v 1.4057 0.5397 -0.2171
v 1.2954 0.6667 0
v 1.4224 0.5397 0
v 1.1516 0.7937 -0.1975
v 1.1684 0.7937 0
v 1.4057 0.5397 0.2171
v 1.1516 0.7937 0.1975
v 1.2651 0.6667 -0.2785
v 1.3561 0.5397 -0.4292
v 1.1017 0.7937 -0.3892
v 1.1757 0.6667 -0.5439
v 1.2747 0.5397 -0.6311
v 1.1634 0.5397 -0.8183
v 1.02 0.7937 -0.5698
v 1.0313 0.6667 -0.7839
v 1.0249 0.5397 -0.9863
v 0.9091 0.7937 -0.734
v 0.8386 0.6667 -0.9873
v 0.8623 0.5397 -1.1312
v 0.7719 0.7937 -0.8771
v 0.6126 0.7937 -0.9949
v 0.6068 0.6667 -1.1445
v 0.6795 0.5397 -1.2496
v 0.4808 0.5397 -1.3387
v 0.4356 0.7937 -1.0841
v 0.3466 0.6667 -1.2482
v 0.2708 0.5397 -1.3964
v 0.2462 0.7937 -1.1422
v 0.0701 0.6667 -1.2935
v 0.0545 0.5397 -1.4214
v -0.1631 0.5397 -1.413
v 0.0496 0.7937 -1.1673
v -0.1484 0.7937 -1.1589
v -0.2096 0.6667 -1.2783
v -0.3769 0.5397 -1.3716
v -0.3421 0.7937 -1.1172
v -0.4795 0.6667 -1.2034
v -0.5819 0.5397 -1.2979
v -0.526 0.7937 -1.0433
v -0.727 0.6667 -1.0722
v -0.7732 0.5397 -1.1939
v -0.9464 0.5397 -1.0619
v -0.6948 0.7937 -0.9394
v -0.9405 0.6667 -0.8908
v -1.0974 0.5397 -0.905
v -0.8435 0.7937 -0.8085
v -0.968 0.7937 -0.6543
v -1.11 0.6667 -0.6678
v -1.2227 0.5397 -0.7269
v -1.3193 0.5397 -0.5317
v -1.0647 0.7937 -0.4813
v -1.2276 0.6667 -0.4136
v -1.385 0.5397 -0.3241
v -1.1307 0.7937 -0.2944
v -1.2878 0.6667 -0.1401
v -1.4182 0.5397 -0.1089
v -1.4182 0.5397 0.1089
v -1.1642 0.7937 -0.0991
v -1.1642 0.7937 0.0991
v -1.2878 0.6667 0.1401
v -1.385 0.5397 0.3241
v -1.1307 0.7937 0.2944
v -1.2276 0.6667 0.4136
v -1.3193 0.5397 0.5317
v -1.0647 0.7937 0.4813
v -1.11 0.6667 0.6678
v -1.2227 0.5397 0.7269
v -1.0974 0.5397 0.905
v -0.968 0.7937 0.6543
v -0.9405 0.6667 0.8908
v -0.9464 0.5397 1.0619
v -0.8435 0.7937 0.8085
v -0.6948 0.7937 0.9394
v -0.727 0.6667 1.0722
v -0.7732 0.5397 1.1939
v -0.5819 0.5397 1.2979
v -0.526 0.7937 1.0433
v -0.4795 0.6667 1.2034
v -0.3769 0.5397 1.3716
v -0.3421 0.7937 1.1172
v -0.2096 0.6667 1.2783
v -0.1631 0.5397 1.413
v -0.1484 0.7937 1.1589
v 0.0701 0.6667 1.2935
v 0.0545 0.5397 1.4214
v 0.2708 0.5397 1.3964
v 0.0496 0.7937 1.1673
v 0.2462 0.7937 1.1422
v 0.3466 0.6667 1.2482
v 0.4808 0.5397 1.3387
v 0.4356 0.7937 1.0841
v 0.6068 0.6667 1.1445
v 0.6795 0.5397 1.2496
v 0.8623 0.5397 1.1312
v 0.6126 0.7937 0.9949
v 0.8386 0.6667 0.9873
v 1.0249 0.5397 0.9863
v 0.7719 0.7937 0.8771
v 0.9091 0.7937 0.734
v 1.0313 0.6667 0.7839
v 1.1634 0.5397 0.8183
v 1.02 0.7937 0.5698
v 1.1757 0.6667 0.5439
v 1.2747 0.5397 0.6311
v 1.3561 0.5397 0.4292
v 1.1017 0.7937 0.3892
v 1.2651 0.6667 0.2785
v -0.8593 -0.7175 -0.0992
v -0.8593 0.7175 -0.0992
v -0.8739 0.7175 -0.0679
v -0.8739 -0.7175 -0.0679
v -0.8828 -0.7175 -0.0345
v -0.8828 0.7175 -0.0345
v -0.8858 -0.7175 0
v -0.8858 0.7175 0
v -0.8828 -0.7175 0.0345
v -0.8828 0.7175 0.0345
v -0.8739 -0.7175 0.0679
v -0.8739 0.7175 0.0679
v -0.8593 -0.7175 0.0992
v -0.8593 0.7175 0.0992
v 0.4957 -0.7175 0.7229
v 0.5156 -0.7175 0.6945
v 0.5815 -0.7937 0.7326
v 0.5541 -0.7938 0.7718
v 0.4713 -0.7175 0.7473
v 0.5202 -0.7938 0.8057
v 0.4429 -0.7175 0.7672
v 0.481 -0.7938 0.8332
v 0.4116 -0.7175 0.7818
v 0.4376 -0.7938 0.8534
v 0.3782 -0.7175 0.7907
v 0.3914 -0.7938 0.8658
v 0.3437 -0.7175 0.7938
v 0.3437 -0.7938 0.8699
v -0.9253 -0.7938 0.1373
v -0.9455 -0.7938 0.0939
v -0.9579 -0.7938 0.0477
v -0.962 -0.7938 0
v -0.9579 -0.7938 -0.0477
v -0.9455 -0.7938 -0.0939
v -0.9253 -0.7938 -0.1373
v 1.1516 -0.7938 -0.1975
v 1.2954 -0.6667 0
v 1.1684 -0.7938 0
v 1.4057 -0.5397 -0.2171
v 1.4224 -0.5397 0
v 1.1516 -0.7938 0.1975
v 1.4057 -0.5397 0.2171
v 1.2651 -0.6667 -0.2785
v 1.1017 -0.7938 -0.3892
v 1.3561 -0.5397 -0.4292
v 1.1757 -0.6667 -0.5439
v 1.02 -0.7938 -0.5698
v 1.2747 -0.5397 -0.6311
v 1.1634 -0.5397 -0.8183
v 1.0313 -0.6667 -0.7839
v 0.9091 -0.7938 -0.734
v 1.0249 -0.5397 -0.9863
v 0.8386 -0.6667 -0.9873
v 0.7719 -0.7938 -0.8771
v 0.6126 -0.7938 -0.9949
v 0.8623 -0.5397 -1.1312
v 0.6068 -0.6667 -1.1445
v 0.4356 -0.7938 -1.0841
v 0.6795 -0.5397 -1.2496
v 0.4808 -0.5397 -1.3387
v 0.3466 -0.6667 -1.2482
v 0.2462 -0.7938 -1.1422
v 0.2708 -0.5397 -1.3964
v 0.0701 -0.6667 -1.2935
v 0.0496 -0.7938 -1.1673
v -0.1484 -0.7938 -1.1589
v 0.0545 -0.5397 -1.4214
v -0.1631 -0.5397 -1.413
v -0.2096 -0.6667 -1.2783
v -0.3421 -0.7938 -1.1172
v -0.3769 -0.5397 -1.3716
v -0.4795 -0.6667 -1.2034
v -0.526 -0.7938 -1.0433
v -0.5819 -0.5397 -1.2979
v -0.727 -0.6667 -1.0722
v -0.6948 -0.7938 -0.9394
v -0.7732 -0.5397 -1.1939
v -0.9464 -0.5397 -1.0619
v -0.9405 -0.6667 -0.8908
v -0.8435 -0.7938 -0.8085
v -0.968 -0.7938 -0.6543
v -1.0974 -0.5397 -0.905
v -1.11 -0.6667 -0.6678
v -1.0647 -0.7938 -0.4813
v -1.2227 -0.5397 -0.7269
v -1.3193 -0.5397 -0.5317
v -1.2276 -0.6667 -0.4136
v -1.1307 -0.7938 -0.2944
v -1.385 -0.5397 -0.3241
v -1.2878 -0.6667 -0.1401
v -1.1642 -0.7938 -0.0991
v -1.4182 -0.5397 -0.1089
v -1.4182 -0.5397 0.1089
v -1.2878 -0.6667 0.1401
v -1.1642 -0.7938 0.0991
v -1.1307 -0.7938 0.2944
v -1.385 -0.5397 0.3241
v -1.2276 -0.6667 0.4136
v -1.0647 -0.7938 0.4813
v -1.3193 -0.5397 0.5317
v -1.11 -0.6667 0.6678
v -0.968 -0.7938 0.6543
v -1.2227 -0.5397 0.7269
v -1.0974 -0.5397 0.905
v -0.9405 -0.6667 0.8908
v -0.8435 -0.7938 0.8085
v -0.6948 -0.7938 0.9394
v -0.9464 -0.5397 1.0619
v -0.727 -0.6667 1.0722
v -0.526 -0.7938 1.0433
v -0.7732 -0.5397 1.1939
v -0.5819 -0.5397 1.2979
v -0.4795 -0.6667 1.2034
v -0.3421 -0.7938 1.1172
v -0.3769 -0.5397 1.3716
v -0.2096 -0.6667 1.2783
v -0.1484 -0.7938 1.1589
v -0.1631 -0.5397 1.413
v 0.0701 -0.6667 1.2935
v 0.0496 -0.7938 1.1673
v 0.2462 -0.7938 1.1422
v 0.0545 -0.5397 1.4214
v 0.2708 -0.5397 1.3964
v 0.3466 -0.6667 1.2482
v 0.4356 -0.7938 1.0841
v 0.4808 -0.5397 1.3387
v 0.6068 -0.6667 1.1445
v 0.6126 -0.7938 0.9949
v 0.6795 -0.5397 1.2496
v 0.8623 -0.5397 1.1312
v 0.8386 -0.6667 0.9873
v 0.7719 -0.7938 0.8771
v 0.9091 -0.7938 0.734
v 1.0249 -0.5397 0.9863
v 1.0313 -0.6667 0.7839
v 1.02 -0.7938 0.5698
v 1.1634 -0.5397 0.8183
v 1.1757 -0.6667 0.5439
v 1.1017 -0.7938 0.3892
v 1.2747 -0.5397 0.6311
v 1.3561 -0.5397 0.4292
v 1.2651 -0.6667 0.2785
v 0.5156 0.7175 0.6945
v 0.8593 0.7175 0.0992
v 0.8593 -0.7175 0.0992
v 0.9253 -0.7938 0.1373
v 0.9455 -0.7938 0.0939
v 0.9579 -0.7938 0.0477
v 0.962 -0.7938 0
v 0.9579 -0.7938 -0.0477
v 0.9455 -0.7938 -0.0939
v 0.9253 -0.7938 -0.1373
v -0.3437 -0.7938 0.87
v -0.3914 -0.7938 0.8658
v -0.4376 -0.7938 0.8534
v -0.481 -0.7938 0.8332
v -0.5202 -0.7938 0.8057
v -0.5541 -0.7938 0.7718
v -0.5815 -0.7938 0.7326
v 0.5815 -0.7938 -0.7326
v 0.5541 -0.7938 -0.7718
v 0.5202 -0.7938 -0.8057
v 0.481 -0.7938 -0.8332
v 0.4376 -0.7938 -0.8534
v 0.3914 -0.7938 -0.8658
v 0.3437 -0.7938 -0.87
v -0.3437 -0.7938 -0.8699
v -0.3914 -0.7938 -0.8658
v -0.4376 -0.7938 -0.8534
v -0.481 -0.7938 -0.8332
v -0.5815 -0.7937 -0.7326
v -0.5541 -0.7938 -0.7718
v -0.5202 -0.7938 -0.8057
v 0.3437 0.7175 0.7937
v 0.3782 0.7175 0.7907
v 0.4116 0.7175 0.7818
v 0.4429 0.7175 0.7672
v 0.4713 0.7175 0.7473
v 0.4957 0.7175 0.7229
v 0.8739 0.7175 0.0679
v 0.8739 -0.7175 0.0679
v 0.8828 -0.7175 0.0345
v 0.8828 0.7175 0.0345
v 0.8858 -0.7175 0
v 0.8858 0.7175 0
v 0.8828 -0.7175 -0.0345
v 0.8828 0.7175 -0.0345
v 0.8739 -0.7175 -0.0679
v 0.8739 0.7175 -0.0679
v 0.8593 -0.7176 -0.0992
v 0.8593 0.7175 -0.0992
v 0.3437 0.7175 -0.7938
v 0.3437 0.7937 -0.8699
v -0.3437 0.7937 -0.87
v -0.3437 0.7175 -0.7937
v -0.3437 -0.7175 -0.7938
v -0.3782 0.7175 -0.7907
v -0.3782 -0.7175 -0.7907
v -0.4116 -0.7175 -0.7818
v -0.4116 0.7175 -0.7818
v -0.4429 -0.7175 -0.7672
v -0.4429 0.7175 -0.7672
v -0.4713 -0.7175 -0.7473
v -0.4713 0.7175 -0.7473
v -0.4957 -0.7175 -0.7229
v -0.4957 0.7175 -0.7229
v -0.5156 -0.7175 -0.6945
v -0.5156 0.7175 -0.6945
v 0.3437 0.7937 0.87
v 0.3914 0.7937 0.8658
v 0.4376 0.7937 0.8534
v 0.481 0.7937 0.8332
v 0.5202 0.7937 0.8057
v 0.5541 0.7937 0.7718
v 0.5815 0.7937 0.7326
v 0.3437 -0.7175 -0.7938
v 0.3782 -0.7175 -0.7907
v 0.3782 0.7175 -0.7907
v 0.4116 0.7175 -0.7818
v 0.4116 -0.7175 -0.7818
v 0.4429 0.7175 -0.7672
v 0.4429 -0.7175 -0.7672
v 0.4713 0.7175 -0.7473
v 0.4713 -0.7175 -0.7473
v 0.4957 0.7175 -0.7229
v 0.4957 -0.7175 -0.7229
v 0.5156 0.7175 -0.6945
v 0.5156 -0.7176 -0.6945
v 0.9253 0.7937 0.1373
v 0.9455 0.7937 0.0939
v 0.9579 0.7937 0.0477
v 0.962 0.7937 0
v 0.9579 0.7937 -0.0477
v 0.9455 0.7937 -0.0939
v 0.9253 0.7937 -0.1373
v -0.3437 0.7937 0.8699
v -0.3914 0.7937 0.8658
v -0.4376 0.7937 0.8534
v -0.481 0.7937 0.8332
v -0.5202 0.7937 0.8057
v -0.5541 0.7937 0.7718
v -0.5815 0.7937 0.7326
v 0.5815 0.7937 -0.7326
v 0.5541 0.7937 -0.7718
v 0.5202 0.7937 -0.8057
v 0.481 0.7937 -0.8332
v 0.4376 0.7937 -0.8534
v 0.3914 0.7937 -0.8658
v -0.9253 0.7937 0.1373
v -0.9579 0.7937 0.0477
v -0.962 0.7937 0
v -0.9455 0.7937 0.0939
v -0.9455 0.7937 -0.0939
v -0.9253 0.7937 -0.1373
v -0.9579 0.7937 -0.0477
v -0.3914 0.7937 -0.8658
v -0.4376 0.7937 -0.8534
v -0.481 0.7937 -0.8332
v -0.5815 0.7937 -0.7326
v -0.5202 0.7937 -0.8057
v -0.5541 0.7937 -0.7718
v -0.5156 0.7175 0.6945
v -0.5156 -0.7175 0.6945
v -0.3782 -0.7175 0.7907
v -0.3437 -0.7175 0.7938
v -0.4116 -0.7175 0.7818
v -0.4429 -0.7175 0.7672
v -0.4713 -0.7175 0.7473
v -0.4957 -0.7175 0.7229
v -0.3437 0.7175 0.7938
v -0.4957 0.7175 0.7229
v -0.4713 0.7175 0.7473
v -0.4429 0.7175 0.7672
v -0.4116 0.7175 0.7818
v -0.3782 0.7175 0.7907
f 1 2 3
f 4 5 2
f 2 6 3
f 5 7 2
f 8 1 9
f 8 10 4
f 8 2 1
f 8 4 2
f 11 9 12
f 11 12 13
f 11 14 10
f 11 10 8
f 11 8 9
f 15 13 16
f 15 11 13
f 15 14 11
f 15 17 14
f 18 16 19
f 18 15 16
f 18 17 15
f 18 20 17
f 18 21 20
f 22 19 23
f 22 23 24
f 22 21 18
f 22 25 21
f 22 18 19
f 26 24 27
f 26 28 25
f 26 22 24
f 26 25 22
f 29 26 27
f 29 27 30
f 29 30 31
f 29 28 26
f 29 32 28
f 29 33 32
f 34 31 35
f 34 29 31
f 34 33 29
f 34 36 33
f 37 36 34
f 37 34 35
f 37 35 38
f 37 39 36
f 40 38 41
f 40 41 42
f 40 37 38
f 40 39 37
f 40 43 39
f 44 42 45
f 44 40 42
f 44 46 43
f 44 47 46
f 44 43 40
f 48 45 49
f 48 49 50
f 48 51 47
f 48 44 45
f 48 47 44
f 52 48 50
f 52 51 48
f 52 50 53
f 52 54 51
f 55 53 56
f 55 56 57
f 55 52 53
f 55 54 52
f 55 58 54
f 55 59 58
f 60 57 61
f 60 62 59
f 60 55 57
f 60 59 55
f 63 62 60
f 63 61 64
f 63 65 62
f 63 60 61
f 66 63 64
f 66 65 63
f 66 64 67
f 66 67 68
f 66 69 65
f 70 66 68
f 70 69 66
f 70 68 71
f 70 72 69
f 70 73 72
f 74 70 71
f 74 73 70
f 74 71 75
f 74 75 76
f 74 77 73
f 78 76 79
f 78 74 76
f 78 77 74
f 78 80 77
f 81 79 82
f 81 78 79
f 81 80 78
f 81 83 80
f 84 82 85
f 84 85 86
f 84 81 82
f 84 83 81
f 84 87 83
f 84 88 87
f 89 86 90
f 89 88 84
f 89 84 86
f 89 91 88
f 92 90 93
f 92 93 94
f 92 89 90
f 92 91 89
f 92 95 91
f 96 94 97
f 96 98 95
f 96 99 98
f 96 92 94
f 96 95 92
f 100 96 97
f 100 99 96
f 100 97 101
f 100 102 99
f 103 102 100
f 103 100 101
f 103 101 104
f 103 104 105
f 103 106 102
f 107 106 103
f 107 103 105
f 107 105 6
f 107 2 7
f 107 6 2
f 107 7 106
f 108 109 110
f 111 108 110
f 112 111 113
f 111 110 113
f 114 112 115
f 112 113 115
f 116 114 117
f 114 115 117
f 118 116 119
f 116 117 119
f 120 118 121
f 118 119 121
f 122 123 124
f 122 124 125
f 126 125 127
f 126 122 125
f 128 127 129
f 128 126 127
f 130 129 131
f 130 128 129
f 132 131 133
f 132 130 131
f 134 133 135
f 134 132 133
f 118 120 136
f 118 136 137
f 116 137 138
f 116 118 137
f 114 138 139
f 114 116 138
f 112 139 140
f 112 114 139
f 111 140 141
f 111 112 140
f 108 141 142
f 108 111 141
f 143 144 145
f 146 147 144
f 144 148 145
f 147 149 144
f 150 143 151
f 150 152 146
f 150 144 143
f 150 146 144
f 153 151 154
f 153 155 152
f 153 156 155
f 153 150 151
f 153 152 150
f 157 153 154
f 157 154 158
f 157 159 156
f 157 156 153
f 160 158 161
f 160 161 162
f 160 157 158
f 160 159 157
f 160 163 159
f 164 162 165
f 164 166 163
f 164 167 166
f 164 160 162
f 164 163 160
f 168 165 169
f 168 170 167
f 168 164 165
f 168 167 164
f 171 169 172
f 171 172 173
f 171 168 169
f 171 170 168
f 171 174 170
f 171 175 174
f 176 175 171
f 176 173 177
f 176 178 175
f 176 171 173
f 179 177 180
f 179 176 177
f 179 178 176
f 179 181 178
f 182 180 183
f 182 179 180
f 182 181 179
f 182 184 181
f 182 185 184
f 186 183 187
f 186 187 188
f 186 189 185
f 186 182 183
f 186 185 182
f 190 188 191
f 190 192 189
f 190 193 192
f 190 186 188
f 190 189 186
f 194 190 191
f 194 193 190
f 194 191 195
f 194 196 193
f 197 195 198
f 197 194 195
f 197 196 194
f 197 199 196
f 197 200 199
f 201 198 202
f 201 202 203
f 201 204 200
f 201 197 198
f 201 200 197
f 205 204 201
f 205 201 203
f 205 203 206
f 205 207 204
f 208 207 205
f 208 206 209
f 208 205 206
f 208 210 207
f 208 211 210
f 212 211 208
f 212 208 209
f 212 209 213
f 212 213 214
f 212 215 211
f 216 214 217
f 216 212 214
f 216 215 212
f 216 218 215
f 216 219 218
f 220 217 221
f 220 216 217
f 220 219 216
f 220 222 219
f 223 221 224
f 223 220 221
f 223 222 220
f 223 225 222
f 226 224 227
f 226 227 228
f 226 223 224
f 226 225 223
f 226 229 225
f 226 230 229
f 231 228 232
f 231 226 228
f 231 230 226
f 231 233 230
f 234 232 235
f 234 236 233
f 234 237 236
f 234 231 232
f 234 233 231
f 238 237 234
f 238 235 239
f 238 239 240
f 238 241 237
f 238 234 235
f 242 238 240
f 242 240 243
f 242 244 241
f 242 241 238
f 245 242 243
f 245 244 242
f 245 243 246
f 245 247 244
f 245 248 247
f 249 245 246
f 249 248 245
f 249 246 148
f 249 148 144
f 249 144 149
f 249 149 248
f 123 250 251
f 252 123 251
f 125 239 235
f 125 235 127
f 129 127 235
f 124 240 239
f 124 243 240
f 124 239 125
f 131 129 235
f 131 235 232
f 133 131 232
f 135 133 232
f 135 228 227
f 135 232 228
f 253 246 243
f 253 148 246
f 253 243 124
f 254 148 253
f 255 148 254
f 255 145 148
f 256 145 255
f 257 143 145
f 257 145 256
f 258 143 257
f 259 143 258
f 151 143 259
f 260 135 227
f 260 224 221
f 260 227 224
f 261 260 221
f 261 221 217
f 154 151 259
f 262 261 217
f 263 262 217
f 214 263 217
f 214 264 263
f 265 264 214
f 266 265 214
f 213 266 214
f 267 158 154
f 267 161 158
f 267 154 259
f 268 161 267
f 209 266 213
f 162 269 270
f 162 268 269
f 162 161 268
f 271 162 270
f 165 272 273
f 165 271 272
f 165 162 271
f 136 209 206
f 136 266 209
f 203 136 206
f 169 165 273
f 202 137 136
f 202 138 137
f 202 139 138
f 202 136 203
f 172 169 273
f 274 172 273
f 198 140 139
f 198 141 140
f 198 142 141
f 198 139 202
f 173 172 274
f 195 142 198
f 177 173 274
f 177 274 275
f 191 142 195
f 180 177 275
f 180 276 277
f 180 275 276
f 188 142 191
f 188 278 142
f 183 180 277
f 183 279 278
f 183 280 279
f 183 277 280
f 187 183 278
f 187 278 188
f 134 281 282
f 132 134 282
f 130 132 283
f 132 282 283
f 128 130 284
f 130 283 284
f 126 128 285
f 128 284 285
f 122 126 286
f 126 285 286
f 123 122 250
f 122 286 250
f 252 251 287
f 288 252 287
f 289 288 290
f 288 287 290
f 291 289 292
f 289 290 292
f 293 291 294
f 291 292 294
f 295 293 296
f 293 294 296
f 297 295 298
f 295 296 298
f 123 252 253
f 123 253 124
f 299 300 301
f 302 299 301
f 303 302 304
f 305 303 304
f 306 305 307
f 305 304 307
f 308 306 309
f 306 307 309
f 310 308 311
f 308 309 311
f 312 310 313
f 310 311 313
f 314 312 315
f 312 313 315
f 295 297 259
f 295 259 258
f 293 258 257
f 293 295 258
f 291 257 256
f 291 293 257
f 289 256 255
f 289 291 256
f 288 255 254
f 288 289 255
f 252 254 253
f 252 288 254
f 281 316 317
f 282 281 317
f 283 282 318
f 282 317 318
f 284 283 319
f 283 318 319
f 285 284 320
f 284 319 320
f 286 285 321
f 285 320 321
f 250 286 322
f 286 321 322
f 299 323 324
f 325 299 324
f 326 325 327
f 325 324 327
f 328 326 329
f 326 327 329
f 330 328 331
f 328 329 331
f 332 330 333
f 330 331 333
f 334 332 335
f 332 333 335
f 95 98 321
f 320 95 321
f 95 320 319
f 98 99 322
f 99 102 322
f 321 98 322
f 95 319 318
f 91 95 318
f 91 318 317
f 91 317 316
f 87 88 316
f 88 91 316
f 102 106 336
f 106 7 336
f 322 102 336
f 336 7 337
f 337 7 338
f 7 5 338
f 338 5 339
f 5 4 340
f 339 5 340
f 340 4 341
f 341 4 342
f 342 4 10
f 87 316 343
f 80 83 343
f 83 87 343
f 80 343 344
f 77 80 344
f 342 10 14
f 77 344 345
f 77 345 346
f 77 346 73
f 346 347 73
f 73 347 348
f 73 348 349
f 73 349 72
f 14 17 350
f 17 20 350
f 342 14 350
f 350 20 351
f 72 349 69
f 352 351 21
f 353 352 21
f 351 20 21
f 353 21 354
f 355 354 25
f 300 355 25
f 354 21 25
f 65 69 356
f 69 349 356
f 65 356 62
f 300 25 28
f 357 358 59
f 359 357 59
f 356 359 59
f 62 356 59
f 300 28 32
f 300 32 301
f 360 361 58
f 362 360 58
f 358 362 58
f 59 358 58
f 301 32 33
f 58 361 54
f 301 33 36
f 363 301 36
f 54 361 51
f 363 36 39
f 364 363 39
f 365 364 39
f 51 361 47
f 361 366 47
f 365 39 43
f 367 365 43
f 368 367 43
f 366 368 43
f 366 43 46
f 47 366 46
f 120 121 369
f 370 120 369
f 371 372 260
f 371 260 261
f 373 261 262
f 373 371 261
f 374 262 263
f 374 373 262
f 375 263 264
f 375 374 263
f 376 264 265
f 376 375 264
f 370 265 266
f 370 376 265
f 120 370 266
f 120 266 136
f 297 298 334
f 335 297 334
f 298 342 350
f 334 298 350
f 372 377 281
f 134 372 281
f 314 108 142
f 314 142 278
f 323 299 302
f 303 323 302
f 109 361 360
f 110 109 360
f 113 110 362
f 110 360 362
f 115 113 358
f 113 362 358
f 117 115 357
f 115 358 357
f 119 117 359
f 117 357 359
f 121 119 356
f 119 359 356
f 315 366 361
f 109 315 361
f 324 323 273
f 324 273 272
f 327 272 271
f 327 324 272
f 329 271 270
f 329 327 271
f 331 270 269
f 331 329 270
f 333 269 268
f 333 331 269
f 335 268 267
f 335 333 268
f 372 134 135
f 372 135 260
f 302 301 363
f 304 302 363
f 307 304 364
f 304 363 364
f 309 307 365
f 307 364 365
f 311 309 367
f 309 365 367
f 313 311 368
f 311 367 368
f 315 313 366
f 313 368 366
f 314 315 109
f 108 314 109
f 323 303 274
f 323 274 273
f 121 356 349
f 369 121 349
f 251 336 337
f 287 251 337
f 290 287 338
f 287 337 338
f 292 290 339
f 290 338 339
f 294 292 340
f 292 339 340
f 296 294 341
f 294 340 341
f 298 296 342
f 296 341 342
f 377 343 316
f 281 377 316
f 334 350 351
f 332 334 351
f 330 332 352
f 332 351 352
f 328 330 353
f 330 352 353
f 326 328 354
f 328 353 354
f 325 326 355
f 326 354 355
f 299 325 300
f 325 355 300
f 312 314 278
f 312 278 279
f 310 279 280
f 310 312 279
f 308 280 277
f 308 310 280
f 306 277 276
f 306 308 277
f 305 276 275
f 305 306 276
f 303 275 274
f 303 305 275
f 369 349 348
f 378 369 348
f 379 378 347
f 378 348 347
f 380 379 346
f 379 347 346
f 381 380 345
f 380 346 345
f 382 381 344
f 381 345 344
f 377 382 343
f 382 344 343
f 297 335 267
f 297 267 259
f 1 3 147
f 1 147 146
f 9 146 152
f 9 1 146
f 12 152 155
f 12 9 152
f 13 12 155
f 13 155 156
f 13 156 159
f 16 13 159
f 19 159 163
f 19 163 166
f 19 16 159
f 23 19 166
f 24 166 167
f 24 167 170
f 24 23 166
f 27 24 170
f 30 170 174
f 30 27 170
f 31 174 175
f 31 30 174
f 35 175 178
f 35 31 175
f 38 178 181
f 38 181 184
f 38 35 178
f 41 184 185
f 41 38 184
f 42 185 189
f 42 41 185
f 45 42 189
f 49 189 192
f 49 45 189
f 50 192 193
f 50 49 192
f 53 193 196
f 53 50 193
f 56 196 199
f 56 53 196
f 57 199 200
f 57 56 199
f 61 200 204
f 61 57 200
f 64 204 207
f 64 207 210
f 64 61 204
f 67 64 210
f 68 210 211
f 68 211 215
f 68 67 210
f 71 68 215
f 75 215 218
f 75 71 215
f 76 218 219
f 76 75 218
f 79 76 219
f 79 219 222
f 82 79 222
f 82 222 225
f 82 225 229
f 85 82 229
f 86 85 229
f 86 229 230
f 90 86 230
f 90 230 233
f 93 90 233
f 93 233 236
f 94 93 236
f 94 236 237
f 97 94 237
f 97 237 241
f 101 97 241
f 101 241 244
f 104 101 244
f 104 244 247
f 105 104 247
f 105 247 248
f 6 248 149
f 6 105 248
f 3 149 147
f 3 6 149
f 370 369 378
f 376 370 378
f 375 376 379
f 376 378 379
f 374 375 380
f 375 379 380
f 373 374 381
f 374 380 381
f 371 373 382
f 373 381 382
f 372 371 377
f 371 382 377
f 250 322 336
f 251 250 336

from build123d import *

# Parameters (mm, degrees)
SKETCH1_W               = 1.4224
SKETCH1_H               = 1.5875
CUT_EXTRUDE1_DEPTH      = 1.79375
CUT_EXTRUDE1_DEPTH_BACK = 1.79375
FILLET1_R               = 0.1984375
CHAMFER1_SIZE           = 0.254
CHAMFER2_SIZE           = 0.0762


with BuildPart() as part:
    # Sketch1 → Revolve1 (revolve)
    with BuildSketch(Plane.XY):
        with Locations((0.7112, 0)):
            Rectangle(SKETCH1_W, SKETCH1_H)
    revolve(axis=Axis((0, -1.704166029, 0), (0, 1, 0)))

    # Sketch3 → Cut-Extrude1 (cut, two sides)
    with BuildSketch(Plane(origin=(0, 0, 0), x_dir=(1, 0, 0), z_dir=(0, 1, 0))) as cut_extrude1_sk:
        Polygon((0.916543552, 0), (0.458271776, 0.79375), (-0.458271776, 0.79375), (-0.916543552, 0), (-0.458271776, -0.79375), (0.458271776, -0.79375), align=None)
    extrude(amount=CUT_EXTRUDE1_DEPTH, mode=Mode.SUBTRACT)
    extrude(cut_extrude1_sk.sketch, amount=-CUT_EXTRUDE1_DEPTH_BACK, mode=Mode.SUBTRACT)

    # Fillet1
    fillet1_edges = [part.edges().sort_by_distance(p)[0] for p in [
        (0.458271776, 0, -0.79375),
        (0.916543552, 0, 0),
        (0.458271776, 0, 0.79375),
        (-0.458271776, 0, 0.79375),
        (-0.916543552, 0, 0),
        (-0.458271776, 0, -0.79375),
    ]]
    fillet(fillet1_edges, radius=FILLET1_R)

    # Chamfer1
    chamfer1_edges = [part.edges().sort_by_distance(p)[0] for p in [
        (-1.4224, 0.79375, 0),
        (-1.4224, -0.79375, 0),
    ]]
    chamfer(chamfer1_edges, length=CHAMFER1_SIZE)

    # Chamfer2
    chamfer2_edges = [part.edges().sort_by_distance(p)[0] for p in [
        (0.687407664, -0.79375, -0.396875),
        (0.687407664, 0.79375, -0.396875),
        (0.687407664, -0.79375, 0.396875),
        (0.687407664, 0.79375, 0.396875),
        (0, -0.79375, 0.79375),
        (0, 0.79375, 0.79375),
        (-0.687407664, -0.79375, 0.396875),
        (-0.687407664, 0.79375, 0.396875),
        (-0.687407664, -0.79375, -0.396875),
        (-0.687407664, 0.79375, -0.396875),
        (0, -0.79375, -0.79375),
        (0, 0.79375, -0.79375),
        (0.885845164, 0.79375, 0),
        (0.885845164, -0.79375, 0),
        (0.442922582, 0.79375, 0.767164416),
        (0.442922582, -0.79375, 0.767164416),
        (-0.442922582, 0.79375, 0.767164416),
        (-0.442922582, -0.79375, 0.767164416),
        (-0.885845164, 0.79375, 0),
        (-0.885845164, -0.79375, 0),
        (-0.442922582, 0.79375, -0.767164416),
        (-0.442922582, -0.79375, -0.767164416),
        (0.442922582, 0.79375, -0.767164416),
        (0.442922582, -0.79375, -0.767164416),
    ]]
    chamfer(chamfer2_edges, length=CHAMFER2_SIZE)


solid = part.part
